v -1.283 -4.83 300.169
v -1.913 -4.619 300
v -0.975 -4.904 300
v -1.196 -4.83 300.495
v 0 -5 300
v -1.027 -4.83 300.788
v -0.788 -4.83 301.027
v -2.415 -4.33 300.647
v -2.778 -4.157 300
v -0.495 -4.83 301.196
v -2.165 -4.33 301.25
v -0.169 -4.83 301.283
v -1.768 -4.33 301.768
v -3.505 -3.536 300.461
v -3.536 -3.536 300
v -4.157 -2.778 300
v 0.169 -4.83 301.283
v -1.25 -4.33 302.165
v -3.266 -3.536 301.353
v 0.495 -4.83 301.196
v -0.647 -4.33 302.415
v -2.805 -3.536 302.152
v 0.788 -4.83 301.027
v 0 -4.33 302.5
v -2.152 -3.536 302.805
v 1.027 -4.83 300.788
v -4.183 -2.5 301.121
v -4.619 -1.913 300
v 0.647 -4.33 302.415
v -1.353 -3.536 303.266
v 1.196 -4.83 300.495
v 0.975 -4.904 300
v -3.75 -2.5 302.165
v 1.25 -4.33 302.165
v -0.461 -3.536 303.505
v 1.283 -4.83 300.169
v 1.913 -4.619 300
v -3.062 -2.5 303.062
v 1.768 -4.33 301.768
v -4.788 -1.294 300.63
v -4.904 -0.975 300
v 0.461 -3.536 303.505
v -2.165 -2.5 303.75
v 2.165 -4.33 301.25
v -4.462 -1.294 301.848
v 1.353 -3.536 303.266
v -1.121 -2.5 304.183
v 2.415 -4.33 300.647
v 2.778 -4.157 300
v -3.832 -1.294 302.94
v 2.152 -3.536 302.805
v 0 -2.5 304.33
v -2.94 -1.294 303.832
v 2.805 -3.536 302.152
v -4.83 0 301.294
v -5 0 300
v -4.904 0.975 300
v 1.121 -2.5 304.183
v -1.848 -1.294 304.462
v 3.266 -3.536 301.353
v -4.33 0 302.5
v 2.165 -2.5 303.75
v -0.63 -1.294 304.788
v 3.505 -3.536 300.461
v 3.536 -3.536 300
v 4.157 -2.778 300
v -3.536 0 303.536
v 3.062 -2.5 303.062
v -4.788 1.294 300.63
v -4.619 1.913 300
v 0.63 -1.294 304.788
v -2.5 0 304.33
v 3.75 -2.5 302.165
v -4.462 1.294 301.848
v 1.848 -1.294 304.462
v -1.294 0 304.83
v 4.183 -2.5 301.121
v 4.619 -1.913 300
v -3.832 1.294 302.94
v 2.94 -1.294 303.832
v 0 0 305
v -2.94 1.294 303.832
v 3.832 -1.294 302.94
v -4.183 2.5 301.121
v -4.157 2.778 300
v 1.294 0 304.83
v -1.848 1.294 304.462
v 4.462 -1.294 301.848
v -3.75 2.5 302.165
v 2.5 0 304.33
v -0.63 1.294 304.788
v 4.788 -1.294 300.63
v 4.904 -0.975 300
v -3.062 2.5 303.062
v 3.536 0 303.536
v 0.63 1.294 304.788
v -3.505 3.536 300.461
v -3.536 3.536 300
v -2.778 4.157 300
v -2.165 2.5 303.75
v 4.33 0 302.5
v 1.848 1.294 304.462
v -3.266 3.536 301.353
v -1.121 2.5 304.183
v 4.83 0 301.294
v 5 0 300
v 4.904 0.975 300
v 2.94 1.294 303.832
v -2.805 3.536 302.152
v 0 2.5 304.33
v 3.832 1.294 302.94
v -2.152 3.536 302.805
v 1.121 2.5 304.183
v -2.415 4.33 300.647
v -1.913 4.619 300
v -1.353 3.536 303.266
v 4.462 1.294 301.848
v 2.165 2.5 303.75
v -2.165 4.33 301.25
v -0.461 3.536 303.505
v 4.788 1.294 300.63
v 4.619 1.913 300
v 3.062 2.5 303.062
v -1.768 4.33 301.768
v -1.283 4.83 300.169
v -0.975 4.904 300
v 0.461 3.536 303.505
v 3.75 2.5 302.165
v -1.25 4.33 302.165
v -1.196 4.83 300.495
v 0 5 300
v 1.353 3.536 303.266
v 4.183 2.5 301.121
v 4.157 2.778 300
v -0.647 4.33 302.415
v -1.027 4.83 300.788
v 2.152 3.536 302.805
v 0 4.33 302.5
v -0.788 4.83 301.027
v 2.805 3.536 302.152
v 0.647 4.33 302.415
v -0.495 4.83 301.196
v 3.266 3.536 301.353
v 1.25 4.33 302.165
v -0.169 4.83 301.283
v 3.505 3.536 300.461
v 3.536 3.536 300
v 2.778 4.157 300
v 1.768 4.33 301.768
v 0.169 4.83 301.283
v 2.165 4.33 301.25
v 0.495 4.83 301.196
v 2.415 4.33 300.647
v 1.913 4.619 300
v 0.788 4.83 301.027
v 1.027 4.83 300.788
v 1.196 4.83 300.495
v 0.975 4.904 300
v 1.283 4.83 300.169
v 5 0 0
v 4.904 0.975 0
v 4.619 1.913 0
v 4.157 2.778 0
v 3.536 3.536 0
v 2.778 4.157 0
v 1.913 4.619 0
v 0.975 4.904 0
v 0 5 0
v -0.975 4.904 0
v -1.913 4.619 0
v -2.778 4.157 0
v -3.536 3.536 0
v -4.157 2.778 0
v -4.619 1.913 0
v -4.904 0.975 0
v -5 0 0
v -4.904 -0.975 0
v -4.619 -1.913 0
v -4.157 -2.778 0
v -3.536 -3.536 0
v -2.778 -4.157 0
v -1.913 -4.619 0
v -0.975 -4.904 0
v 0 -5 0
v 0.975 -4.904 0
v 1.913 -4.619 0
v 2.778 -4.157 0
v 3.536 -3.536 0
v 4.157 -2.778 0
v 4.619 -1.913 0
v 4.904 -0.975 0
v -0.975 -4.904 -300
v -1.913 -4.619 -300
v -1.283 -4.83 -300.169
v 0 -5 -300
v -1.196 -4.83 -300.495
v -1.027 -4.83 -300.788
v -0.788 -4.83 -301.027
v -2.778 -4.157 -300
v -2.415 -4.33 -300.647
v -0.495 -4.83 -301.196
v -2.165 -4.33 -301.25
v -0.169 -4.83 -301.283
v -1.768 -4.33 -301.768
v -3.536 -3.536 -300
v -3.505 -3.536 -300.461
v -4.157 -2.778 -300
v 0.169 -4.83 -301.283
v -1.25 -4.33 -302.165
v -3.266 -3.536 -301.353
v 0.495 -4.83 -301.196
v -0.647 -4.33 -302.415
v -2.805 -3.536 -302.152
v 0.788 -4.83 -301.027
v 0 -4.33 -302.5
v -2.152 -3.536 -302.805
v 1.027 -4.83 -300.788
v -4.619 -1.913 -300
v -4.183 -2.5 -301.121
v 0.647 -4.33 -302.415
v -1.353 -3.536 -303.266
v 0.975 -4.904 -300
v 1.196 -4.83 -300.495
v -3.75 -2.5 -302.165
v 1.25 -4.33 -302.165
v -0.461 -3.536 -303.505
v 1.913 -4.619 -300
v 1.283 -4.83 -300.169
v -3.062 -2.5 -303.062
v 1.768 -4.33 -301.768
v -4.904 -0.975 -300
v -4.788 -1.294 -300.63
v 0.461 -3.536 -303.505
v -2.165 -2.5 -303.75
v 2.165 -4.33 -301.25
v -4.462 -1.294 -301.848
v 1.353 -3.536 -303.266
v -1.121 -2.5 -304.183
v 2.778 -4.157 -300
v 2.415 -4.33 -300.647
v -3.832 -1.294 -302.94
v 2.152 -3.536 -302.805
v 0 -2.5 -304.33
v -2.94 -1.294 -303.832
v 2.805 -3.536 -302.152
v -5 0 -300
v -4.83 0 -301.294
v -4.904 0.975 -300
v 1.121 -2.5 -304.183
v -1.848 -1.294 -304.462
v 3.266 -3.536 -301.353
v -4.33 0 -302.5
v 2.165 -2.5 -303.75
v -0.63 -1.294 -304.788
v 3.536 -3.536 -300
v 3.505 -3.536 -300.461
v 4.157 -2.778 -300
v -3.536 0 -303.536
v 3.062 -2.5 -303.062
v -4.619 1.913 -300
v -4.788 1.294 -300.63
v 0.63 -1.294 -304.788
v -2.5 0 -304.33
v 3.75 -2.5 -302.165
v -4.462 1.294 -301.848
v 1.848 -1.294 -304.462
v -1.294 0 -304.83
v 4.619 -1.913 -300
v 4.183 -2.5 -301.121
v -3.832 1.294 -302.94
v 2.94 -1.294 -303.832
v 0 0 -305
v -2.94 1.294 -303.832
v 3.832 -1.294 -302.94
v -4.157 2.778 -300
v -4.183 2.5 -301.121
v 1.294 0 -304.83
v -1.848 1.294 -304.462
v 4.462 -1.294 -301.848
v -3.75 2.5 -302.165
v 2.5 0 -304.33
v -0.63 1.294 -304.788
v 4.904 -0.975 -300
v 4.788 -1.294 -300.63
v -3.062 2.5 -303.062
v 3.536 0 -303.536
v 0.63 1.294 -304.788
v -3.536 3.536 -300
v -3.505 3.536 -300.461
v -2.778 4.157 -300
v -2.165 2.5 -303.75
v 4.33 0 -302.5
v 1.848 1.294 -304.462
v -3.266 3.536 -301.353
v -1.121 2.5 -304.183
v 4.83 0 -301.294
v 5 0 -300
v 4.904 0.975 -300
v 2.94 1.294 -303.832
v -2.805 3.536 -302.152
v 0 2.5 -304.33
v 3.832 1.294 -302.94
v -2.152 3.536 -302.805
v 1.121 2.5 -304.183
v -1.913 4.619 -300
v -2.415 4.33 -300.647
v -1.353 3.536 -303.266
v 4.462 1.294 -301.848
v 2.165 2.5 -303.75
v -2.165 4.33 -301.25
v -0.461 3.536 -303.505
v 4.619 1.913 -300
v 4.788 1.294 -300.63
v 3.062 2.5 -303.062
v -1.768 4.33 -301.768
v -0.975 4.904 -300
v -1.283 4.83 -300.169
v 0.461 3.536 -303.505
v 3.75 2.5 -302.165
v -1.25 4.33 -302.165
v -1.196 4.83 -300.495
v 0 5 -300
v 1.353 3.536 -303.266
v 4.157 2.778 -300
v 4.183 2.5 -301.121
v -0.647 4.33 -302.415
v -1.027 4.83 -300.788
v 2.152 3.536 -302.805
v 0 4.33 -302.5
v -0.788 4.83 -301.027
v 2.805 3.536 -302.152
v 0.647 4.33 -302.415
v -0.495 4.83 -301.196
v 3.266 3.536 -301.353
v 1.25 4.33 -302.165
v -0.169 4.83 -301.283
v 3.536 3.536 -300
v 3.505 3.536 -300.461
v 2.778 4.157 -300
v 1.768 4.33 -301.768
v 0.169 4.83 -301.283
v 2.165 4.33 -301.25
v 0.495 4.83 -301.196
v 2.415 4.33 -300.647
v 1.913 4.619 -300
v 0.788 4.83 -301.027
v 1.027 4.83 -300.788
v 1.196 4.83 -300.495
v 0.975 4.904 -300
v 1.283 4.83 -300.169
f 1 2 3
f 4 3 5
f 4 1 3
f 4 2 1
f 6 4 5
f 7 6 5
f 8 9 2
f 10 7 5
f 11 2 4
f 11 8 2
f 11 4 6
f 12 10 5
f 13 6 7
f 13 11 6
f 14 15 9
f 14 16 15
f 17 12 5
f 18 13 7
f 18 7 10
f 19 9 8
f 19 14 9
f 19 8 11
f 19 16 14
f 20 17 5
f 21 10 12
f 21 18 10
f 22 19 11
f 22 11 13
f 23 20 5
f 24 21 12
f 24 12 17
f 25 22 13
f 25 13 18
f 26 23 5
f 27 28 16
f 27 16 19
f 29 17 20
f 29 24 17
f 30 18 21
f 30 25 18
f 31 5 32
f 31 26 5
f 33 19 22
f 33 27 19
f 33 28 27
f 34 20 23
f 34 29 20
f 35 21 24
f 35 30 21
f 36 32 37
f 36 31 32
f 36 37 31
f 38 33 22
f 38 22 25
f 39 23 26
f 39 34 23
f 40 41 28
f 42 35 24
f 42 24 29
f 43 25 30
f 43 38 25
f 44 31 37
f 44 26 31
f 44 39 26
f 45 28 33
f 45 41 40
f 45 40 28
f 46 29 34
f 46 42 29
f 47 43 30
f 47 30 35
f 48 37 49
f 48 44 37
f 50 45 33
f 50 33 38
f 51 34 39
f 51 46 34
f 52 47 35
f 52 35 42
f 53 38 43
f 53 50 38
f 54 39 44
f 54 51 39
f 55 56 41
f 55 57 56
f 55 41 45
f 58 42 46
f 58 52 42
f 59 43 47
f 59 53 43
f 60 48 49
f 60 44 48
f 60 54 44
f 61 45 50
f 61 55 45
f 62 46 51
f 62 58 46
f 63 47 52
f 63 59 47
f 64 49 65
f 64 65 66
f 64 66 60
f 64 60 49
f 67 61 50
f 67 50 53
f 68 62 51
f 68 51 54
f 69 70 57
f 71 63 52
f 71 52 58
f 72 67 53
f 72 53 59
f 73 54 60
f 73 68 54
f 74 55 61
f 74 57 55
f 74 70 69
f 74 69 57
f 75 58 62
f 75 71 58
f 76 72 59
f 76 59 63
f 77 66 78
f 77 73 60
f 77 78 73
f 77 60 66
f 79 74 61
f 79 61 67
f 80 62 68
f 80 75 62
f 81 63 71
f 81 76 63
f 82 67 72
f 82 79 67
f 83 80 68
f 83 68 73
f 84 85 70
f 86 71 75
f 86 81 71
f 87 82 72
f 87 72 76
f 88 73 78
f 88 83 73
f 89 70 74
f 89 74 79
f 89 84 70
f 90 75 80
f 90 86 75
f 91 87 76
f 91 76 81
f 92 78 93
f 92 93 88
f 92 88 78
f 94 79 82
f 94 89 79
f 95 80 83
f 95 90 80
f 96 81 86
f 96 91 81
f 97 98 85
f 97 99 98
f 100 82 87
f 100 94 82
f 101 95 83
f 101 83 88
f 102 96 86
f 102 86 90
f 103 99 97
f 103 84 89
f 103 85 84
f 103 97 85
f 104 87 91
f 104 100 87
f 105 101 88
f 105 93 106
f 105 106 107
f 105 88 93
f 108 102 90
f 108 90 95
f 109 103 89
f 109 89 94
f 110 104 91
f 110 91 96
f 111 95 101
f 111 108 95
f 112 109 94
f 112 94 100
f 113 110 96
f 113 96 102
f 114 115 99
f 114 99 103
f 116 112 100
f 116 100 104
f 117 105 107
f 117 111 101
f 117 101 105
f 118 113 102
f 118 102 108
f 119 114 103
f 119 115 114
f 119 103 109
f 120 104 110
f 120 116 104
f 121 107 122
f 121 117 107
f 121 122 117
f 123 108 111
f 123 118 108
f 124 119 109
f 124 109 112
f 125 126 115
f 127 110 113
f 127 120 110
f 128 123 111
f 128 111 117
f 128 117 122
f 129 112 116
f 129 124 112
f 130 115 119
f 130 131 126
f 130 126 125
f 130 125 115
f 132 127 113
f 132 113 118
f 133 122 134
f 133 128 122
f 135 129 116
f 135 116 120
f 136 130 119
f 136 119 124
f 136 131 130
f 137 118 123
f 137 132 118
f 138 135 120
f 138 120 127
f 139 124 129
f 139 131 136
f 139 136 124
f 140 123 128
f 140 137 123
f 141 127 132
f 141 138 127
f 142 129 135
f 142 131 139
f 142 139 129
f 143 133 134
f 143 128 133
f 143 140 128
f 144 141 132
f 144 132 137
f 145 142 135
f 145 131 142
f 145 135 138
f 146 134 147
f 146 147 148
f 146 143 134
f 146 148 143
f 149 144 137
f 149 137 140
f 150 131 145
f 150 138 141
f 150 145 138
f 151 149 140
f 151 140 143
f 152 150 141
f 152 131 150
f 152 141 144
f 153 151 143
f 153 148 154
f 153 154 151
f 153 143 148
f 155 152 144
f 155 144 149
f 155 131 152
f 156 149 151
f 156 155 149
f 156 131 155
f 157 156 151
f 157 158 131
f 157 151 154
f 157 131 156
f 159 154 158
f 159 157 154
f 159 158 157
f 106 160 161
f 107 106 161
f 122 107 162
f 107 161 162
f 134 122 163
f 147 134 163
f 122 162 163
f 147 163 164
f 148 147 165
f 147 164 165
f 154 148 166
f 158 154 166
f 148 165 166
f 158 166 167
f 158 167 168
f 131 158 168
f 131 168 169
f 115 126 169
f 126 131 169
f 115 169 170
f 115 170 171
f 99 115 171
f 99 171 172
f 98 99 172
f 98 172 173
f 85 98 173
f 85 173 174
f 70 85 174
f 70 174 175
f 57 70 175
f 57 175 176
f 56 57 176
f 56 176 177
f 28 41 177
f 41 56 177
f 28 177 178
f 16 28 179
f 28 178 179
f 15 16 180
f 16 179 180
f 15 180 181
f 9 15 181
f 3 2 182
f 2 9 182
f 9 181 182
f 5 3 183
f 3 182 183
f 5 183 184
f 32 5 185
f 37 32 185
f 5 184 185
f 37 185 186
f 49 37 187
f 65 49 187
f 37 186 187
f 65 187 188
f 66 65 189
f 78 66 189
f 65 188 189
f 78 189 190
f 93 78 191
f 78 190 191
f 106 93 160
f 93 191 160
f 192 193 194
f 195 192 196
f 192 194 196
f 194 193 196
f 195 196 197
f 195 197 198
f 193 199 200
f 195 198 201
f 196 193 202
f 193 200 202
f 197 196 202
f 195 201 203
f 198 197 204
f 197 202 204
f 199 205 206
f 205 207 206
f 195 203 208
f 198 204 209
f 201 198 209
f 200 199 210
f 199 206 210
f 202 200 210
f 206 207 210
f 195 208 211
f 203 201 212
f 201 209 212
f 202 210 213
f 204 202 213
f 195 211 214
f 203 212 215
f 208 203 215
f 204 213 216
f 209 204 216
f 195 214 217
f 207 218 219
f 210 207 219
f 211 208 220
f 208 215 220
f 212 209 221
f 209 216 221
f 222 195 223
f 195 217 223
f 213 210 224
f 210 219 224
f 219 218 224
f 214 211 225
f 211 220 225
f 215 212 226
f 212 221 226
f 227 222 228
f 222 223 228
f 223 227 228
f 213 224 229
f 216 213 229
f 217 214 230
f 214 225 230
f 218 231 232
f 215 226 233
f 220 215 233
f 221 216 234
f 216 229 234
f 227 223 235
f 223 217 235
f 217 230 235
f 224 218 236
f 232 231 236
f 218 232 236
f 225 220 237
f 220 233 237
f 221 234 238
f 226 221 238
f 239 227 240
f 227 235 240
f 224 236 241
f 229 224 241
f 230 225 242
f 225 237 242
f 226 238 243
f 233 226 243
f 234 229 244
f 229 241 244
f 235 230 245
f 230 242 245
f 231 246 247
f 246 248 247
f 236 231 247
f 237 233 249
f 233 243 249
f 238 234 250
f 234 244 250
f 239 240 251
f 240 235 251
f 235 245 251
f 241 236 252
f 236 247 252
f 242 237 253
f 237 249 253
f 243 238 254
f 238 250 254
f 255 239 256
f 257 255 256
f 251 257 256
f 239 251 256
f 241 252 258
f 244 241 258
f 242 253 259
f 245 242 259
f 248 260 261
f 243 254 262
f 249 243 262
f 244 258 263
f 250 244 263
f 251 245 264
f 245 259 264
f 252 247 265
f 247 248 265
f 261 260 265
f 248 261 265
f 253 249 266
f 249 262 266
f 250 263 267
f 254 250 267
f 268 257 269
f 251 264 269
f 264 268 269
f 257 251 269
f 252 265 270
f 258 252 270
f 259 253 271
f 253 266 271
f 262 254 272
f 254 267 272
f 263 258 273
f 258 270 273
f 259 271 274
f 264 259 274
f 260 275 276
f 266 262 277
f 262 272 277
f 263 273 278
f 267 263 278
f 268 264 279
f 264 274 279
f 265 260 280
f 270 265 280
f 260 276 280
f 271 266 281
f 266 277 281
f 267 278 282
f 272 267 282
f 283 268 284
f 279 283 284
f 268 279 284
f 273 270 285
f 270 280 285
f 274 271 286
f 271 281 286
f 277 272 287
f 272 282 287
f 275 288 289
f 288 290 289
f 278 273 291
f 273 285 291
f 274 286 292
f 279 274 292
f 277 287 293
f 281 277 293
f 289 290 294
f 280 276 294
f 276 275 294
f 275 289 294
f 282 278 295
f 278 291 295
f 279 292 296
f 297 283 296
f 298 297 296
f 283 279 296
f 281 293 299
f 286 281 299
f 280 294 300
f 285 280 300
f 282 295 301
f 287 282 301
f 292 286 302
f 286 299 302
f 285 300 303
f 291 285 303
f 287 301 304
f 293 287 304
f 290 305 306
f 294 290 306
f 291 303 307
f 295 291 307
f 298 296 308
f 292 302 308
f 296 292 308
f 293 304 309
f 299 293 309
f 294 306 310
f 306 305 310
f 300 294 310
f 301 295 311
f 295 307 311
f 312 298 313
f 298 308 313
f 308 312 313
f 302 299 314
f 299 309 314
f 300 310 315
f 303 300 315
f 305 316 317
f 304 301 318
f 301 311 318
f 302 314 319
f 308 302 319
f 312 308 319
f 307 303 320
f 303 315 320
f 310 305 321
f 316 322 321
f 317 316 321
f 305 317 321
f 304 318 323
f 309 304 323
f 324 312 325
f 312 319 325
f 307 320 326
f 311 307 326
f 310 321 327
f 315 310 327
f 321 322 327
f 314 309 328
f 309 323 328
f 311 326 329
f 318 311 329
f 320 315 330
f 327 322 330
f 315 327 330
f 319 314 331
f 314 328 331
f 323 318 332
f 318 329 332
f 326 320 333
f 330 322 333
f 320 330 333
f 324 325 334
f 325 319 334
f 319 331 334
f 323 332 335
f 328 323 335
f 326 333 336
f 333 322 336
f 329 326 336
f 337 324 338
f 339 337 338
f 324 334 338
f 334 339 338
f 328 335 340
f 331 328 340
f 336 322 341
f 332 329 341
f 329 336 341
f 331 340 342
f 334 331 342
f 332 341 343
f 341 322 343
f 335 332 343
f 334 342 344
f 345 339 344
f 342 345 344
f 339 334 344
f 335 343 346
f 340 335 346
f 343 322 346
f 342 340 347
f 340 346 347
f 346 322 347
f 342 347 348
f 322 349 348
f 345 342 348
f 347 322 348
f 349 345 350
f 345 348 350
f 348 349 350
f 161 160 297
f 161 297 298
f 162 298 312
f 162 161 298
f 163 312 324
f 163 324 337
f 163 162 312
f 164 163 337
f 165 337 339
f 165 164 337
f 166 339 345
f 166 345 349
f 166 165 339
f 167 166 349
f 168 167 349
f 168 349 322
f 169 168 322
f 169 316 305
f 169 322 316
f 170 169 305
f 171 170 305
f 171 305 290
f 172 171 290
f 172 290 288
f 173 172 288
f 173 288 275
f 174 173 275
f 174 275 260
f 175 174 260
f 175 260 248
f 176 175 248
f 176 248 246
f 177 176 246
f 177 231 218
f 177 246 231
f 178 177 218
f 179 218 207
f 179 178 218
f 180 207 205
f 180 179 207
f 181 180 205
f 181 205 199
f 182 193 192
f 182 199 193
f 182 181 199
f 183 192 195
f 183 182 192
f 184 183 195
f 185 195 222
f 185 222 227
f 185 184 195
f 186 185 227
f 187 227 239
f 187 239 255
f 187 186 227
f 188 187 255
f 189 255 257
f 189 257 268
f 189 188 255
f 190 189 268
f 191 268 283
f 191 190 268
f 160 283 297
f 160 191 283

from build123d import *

# Parameters (mm, degrees)
SKETCH3_R           = 5
BOSS_EXTRUDE1_DEPTH = 300
REVOLVE3_ANGLE      = 180


with BuildPart() as part:
    # Sketch3 → Boss-Extrude1 (new body)
    with BuildSketch(Plane.XY):
        Circle(SKETCH3_R)
    boss_extrude1 = extrude(amount=BOSS_EXTRUDE1_DEPTH)

    # Sketch4 → Revolve3 (revolve)
    with BuildSketch(Plane.XY.offset(300)):
        with BuildLine():
            Line((0, 5), (0, -5))
            ThreePointArc((0, -5), (-5, 0), (0, 5))
        make_face()
    revolve3 = revolve(axis=Axis((0, 5, 300), (0, 1, 0)), revolution_arc=REVOLVE3_ANGLE)

    # Mirror2: Boss-Extrude1, Revolve3 across plane
    add(boss_extrude1.mirror(Plane.XY))
    add(revolve3.mirror(Plane.XY))


solid = part.part
